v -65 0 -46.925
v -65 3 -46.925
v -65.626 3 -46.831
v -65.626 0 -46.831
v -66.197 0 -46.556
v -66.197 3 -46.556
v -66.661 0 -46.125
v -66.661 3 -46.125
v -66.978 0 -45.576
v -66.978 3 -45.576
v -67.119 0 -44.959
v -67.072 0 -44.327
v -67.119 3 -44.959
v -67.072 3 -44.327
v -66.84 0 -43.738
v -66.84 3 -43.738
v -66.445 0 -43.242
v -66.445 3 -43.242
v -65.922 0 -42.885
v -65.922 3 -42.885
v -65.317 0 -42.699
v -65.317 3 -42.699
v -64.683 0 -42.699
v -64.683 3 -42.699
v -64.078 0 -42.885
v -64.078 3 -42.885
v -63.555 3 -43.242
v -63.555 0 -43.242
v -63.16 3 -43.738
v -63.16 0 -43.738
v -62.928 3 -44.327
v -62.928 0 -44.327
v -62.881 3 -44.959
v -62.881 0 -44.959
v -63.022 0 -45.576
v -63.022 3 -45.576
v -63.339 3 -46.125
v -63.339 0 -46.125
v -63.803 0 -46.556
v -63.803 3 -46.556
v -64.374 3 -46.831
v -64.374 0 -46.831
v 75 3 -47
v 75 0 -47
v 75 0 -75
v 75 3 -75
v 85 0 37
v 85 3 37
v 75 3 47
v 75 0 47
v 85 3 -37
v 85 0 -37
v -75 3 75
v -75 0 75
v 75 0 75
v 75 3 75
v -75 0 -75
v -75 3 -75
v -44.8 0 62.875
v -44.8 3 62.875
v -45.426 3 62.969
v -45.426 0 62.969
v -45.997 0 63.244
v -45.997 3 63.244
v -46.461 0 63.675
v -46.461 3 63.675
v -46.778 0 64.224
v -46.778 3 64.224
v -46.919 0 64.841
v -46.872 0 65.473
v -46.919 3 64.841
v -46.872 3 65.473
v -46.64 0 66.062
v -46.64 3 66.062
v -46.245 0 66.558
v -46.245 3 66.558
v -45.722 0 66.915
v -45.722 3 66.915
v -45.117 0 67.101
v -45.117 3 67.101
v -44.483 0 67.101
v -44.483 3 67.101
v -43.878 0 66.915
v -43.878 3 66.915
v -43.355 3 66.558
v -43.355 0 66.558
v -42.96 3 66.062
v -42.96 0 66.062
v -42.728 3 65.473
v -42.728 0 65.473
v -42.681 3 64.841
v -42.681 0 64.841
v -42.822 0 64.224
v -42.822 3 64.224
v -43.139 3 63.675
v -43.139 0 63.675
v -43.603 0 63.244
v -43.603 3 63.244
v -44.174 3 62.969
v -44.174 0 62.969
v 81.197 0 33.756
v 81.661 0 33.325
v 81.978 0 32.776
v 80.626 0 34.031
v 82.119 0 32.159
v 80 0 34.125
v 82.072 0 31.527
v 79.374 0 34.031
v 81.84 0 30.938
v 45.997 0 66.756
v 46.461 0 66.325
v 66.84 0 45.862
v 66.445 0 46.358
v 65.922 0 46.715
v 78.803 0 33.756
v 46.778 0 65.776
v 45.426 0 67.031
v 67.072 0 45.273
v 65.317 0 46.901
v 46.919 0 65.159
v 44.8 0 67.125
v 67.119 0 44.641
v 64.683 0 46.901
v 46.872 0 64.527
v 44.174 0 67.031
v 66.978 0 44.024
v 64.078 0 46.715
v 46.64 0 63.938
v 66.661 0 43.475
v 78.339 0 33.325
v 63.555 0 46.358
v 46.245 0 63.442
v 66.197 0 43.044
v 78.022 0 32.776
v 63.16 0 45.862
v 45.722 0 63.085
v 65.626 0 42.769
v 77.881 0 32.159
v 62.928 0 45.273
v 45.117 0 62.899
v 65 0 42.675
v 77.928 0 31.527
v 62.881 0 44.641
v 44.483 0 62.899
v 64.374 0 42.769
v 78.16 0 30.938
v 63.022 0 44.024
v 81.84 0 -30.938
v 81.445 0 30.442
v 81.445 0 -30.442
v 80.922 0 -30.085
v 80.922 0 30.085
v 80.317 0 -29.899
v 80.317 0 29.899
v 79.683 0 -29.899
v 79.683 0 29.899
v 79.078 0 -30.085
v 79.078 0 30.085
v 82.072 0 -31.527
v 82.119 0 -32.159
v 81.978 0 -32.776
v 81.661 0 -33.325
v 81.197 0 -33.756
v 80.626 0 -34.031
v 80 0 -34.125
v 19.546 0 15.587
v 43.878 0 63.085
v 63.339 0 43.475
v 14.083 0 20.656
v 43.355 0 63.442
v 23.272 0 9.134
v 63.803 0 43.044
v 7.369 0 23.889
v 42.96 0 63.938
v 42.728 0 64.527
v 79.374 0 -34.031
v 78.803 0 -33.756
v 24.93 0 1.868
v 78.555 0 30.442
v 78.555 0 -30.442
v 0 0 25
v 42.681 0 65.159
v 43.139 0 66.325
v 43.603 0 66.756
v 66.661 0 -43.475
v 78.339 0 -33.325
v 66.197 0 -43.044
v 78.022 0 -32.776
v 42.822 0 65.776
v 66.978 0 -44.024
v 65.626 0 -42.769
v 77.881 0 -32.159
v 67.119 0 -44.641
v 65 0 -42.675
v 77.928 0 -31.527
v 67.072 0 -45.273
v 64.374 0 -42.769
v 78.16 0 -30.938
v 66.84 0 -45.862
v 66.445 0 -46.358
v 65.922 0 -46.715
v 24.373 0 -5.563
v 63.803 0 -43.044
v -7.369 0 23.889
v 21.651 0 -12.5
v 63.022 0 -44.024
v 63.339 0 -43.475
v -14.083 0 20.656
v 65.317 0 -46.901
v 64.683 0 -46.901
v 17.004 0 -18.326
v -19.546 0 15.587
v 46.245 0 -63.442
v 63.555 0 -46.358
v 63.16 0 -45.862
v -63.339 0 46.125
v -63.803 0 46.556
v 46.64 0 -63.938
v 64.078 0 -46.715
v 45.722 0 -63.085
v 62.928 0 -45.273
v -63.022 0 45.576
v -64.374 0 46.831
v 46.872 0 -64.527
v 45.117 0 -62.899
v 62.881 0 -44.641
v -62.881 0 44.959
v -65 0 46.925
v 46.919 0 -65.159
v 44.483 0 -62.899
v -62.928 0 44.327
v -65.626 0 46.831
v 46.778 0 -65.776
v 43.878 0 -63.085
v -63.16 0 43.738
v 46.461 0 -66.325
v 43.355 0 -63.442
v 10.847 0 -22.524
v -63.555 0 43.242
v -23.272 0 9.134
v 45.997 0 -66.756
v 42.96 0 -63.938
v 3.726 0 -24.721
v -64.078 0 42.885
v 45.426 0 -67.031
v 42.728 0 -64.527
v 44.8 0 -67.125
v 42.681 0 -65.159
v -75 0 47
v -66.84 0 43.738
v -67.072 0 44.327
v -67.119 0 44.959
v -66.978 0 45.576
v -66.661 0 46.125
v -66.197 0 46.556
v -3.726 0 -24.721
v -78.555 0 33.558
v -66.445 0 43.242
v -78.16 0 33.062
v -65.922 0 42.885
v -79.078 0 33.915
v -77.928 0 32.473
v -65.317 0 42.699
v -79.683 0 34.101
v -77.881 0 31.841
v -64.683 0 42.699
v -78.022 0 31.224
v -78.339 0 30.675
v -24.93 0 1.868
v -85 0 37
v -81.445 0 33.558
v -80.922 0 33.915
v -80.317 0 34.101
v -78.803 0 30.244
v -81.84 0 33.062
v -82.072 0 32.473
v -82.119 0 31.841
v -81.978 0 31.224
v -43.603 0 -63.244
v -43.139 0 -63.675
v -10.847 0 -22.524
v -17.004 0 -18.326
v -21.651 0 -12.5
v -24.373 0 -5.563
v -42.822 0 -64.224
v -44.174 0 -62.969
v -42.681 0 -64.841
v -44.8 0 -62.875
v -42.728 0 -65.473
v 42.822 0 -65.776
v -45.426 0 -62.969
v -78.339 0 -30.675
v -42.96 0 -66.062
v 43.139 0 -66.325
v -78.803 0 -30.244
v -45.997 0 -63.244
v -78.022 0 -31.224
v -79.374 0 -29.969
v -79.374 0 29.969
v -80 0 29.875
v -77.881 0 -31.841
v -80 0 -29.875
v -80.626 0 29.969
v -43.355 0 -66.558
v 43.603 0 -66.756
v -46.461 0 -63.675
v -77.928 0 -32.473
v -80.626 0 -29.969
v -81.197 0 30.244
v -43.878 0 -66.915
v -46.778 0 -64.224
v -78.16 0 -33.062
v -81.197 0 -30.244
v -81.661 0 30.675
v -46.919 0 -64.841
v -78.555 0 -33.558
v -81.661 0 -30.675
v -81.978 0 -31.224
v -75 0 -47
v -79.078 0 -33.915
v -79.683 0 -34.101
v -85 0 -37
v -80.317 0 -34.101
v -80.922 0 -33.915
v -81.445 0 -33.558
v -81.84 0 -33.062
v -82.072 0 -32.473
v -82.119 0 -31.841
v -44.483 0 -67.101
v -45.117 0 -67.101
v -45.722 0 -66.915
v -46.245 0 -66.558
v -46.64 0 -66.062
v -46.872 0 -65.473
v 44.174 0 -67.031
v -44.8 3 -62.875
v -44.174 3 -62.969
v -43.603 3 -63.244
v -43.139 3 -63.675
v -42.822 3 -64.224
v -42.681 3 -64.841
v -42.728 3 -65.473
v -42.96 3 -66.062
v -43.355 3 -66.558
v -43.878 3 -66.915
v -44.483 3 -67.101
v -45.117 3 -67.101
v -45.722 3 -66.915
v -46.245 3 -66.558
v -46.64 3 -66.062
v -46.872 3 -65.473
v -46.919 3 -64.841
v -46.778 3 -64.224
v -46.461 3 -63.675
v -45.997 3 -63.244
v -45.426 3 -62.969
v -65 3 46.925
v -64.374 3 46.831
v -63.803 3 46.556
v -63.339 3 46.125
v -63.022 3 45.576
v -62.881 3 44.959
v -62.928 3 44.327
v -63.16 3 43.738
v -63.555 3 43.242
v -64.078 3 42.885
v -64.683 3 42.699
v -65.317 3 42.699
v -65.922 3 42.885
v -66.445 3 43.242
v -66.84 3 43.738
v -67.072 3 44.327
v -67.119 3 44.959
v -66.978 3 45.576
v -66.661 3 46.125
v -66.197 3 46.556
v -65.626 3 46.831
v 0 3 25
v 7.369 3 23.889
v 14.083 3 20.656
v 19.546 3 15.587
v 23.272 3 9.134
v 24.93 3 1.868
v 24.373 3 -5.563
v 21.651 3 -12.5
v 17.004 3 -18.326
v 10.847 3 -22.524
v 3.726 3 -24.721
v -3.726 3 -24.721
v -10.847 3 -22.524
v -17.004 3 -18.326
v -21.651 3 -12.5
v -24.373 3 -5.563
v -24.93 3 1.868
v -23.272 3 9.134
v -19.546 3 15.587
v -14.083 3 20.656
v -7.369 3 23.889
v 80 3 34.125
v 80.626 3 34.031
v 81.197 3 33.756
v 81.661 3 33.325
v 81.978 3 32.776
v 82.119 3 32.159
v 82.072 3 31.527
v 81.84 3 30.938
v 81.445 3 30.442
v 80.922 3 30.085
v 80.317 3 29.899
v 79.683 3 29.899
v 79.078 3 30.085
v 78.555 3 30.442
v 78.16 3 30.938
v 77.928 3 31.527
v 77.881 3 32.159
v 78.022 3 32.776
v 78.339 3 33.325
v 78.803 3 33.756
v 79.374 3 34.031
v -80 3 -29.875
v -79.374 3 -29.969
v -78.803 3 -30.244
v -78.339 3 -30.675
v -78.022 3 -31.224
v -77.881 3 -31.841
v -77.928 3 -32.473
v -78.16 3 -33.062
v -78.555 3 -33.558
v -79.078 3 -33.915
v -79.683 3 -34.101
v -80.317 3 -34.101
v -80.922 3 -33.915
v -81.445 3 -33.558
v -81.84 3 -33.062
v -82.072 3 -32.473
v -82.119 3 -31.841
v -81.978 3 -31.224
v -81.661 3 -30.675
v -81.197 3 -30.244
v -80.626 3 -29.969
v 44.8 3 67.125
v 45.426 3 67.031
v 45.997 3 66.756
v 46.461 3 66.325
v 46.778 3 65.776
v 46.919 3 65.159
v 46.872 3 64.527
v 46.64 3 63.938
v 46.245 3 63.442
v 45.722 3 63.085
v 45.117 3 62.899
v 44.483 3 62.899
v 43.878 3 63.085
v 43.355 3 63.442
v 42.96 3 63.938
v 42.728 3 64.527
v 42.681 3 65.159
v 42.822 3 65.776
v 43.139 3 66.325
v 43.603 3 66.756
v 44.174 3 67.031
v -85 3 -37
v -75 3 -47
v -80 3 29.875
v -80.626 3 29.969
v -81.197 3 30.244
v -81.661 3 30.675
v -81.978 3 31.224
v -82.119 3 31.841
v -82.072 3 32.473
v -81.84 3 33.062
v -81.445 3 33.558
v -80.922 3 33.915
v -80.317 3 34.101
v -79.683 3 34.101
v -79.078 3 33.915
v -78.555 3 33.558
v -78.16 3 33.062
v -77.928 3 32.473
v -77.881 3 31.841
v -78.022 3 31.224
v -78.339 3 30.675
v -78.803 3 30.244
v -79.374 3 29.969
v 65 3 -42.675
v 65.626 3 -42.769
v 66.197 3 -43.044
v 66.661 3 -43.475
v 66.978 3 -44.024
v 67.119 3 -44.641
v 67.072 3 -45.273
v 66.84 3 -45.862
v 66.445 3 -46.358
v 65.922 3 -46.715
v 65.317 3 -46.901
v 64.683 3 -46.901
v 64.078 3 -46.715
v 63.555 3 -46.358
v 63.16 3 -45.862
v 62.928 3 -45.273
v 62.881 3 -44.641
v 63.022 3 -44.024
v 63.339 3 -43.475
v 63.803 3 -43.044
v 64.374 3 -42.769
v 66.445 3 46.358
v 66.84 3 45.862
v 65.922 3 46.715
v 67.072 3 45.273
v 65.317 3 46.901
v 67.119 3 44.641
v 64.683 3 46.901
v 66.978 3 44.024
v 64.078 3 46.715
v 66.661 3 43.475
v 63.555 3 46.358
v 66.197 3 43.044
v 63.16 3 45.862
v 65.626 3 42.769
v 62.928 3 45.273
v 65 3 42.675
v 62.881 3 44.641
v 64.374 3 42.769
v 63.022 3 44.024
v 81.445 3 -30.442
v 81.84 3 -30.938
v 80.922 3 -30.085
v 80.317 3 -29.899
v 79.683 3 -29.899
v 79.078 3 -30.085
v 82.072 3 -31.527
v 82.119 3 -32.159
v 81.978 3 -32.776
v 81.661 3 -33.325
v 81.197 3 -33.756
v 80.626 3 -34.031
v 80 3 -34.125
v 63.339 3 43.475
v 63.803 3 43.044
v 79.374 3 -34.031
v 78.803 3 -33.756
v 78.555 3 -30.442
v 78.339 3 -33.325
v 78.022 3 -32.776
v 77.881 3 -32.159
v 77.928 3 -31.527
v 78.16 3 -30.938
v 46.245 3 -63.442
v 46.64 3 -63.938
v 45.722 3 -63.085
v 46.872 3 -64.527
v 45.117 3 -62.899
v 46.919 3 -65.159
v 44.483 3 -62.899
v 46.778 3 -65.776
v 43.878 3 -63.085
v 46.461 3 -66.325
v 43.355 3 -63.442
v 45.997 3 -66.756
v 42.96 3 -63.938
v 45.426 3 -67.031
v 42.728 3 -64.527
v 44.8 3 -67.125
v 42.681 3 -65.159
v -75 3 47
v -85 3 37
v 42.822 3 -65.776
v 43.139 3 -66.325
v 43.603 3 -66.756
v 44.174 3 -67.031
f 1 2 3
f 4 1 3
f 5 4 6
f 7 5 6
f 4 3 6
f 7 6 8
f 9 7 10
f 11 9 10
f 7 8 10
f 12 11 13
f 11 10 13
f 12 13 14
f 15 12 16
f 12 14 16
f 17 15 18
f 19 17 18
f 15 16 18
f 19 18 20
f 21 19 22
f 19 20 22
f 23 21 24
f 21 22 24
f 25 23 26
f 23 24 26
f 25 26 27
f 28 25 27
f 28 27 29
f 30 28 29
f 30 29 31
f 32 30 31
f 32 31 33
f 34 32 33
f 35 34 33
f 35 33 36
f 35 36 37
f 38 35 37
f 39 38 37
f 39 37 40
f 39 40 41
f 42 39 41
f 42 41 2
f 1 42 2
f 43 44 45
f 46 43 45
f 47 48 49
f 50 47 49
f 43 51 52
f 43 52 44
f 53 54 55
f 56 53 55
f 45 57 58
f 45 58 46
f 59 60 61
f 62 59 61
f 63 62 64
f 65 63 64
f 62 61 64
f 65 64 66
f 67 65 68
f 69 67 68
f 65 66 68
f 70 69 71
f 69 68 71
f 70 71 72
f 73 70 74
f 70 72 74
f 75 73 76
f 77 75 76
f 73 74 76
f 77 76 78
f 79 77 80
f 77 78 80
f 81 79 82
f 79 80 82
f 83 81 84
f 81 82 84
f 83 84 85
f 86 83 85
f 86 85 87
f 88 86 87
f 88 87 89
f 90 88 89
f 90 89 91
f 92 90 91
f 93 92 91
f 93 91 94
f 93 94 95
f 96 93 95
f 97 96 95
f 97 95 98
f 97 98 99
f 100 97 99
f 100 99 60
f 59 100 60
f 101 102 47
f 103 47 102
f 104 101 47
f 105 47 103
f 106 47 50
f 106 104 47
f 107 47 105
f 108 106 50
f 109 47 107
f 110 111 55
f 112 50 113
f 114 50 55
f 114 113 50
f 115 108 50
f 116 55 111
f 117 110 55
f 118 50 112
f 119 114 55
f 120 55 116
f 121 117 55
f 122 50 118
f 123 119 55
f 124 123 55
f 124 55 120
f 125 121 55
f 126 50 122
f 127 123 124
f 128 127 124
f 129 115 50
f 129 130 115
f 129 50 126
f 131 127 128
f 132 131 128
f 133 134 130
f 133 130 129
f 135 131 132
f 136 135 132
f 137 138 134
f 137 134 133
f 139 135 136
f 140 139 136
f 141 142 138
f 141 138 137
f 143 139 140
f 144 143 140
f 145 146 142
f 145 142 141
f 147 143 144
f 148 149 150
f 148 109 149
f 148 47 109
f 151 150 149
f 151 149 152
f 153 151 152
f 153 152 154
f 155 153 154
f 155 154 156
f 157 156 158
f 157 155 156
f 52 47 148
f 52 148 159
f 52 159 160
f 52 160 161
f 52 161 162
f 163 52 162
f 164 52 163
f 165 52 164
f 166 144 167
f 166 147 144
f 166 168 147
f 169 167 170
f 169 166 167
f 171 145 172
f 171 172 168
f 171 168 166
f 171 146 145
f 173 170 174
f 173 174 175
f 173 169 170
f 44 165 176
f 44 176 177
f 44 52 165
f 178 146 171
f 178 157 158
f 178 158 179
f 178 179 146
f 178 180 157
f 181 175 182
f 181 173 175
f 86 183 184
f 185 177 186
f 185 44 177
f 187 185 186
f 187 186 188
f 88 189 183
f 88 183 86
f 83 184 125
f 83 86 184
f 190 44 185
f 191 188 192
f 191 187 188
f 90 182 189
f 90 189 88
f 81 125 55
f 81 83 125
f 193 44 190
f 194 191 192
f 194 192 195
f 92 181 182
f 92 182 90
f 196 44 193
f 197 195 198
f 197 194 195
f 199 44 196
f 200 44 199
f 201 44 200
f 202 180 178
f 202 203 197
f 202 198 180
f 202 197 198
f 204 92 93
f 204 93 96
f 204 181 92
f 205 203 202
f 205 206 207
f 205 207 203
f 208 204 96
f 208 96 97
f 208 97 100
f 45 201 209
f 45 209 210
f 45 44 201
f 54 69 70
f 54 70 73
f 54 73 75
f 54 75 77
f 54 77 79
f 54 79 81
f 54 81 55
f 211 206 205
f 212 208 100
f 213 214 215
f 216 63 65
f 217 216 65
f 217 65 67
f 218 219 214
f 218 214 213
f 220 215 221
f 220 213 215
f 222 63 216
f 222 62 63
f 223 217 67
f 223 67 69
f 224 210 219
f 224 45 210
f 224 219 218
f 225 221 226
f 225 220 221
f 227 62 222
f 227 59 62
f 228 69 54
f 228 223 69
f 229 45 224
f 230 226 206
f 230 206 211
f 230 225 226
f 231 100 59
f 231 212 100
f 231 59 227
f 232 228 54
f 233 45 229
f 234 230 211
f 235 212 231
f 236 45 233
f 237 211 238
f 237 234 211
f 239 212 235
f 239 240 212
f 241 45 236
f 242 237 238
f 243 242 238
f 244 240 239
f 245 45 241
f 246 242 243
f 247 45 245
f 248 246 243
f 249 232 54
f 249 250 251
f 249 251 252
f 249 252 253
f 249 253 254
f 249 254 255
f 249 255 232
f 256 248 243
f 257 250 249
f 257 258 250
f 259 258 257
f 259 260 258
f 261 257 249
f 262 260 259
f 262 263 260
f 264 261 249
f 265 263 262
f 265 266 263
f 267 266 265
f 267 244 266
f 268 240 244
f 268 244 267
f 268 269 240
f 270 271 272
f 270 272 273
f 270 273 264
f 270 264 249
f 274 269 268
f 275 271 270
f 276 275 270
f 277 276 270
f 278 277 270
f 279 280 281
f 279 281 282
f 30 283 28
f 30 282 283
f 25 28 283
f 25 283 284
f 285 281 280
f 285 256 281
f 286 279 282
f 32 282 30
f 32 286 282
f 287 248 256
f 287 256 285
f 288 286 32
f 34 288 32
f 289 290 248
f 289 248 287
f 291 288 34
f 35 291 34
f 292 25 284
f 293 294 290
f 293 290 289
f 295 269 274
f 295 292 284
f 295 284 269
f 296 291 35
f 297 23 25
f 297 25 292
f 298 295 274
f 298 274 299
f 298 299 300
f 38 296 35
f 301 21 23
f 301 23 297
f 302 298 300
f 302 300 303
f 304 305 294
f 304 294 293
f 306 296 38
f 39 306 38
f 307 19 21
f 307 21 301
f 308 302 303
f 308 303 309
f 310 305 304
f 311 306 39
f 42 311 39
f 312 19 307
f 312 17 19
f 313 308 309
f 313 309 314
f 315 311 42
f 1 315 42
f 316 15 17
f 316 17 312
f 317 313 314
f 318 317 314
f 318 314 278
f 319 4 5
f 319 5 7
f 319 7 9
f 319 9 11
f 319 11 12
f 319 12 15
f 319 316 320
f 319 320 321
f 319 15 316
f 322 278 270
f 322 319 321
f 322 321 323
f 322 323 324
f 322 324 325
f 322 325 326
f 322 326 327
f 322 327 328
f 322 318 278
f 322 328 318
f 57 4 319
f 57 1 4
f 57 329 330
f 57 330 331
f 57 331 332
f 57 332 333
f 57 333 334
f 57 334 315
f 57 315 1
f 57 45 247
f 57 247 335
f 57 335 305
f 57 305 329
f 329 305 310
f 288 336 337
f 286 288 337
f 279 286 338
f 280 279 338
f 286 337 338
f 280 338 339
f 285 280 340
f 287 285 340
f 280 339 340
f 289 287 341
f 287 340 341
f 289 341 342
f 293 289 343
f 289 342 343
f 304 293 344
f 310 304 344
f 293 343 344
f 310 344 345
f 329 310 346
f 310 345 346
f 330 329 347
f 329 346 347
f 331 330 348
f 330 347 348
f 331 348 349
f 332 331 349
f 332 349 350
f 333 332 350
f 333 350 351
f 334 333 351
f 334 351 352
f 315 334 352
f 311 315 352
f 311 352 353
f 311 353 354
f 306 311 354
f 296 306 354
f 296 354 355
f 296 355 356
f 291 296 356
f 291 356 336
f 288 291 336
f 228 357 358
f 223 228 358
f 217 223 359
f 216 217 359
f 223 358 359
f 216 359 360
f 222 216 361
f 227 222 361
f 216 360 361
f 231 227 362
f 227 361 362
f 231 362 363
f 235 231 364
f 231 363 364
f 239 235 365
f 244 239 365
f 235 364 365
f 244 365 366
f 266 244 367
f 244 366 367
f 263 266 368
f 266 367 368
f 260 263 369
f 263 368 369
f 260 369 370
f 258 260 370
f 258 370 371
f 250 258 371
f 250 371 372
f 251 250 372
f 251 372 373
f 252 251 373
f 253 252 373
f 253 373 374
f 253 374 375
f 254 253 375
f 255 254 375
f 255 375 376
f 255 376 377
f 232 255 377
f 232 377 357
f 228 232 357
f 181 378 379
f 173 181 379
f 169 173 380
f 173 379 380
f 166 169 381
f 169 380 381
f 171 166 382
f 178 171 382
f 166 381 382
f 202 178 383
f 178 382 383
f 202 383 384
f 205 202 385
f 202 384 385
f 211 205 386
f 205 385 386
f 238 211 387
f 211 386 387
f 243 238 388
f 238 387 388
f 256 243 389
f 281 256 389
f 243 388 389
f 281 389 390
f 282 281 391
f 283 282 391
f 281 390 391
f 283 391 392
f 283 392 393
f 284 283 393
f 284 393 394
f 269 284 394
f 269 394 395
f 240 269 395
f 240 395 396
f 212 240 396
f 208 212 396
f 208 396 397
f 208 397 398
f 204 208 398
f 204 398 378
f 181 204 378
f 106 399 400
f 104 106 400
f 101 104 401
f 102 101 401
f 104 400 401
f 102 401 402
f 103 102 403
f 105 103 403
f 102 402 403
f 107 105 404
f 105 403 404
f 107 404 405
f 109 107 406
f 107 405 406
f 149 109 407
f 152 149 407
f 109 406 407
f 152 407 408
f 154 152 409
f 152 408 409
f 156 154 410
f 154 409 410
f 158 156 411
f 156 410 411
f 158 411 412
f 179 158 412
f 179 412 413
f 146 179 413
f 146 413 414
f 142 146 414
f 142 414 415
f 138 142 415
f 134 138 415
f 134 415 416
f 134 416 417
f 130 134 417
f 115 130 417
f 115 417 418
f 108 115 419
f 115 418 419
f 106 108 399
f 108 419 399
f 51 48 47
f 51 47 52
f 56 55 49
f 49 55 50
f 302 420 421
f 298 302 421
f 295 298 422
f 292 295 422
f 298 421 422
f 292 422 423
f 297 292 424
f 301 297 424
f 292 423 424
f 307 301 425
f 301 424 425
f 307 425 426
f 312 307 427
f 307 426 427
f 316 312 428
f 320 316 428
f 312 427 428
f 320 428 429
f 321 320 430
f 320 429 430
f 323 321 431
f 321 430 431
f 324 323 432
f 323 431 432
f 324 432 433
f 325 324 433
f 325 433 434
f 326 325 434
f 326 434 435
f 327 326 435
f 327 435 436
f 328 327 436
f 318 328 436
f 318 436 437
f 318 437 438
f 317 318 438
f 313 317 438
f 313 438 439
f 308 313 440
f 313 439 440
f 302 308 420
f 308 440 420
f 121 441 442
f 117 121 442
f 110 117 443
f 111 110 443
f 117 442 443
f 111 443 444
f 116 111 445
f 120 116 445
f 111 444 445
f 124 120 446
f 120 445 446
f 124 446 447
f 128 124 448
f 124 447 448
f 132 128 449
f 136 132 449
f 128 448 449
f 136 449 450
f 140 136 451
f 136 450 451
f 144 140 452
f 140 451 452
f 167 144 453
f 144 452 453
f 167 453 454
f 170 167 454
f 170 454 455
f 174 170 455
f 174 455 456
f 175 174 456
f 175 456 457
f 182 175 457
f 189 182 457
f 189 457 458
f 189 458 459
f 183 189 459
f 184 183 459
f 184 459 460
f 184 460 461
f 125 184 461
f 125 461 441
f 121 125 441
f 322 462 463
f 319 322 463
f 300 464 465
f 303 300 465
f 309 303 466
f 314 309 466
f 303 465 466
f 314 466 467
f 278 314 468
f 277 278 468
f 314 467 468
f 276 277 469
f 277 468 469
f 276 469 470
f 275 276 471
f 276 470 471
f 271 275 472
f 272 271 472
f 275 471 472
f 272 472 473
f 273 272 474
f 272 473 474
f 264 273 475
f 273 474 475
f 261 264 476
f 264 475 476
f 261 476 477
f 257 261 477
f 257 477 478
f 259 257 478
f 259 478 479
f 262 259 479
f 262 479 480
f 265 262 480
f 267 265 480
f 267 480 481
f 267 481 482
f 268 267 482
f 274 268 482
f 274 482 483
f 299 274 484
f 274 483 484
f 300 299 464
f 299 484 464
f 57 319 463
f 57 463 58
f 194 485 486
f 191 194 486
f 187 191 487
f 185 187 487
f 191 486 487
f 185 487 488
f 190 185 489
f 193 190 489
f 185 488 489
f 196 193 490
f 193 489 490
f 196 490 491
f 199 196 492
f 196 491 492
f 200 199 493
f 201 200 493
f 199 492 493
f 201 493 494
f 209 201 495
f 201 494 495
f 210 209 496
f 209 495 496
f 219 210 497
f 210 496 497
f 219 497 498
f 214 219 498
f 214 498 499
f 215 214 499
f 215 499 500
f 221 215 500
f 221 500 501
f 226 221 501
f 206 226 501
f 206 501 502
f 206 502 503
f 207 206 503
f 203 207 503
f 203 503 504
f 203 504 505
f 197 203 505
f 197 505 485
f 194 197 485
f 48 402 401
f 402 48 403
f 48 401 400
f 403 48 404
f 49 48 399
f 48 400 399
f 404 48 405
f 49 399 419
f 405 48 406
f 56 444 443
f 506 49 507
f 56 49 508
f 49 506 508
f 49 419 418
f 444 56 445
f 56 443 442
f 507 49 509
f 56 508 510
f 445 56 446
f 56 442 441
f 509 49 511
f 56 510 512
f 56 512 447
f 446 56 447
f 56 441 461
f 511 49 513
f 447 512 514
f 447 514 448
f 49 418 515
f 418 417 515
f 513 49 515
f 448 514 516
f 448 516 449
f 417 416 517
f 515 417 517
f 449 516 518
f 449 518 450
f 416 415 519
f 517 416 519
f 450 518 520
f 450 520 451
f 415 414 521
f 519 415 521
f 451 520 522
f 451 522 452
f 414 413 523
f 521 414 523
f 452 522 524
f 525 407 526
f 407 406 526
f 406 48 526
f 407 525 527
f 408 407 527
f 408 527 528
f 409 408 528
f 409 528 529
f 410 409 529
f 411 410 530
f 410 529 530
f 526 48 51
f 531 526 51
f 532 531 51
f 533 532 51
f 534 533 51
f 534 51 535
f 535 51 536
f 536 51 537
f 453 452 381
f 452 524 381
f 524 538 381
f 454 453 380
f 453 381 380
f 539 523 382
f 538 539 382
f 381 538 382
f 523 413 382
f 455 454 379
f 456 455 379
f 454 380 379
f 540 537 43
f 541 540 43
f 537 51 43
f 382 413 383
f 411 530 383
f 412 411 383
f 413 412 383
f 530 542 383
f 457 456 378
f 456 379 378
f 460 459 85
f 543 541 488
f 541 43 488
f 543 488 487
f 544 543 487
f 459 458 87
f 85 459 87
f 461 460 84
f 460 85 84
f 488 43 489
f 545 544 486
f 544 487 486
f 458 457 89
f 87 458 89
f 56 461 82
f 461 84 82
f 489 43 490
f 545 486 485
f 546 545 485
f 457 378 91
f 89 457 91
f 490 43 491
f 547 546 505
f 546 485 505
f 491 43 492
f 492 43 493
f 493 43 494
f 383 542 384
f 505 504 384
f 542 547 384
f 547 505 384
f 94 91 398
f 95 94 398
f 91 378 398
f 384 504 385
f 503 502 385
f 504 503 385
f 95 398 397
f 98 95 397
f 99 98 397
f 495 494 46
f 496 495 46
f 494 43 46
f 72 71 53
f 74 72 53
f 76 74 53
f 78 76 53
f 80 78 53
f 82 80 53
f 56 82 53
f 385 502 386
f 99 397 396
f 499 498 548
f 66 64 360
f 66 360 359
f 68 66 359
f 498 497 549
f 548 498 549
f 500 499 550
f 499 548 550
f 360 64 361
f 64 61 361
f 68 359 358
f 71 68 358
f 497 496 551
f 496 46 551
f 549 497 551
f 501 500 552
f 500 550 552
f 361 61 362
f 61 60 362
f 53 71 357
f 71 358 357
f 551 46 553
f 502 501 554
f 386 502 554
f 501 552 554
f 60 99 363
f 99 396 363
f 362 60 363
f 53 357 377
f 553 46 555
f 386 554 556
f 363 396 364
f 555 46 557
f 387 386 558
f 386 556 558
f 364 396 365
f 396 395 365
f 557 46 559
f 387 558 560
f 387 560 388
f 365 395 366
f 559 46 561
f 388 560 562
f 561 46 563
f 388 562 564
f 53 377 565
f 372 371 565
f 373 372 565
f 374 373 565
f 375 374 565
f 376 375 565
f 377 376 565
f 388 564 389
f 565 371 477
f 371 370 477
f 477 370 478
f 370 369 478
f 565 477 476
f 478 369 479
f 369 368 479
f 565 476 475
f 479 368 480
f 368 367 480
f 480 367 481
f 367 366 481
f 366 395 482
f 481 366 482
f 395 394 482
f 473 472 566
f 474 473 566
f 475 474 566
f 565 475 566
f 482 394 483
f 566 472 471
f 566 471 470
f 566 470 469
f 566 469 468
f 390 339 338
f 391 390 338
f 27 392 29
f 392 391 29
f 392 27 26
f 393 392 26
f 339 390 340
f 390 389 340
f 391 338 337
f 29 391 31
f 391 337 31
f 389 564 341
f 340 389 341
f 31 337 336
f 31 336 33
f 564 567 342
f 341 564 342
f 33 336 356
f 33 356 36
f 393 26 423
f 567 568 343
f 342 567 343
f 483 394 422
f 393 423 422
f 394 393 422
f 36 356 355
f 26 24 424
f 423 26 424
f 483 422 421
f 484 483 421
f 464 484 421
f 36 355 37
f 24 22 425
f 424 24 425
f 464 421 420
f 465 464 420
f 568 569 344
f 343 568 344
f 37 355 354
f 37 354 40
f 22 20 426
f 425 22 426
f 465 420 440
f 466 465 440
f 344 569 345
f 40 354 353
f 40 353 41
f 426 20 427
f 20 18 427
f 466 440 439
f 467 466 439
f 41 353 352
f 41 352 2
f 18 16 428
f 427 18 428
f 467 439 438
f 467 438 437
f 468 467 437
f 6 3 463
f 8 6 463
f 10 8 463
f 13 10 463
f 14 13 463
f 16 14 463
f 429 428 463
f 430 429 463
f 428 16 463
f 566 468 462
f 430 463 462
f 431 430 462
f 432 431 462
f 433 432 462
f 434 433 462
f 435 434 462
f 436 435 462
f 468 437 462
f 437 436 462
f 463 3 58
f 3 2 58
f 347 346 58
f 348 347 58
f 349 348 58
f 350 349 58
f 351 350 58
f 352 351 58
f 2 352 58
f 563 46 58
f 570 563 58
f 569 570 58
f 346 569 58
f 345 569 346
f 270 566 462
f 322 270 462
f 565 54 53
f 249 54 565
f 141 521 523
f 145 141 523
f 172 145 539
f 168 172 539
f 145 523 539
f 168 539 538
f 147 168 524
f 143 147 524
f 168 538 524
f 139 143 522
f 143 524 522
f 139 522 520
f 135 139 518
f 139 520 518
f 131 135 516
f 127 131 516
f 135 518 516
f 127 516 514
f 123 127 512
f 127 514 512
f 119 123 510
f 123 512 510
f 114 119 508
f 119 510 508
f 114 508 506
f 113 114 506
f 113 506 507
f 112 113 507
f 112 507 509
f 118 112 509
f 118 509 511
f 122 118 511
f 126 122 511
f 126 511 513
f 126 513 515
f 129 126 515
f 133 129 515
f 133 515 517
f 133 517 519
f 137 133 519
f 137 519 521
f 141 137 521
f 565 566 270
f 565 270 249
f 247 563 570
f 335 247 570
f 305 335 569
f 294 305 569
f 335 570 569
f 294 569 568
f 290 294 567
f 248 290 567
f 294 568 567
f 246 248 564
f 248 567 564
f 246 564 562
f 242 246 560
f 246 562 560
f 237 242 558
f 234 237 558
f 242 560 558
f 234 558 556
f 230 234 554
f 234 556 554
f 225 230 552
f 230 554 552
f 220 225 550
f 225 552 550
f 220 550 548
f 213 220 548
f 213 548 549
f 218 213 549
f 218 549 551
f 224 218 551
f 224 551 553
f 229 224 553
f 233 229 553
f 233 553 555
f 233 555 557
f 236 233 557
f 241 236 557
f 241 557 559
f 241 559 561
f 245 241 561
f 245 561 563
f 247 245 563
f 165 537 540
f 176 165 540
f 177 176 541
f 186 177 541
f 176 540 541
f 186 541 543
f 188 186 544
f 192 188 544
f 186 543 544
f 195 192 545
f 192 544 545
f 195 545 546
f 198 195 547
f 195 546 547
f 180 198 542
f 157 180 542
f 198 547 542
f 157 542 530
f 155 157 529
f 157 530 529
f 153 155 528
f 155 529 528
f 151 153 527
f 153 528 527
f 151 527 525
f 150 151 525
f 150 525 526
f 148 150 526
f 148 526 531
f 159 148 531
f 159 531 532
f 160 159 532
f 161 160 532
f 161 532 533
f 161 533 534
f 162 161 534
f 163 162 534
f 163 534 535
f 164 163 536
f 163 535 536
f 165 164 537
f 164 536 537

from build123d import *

# Parameters (mm, degrees)
SKETCH1_W           = 150
SKETCH1_H           = 150
BOSS_EXTRUDE1_DEPTH = 3
SKETCH2_R           = 2.125
SKETCH2_R_2         = 25
CUT_EXTRUDE3_DEPTH  = 107.108435103
SKETCH3_W           = 10
SKETCH3_H           = 74
SKETCH3_R           = 2.125
BOSS_EXTRUDE2_DEPTH = 3
BOSS_EXTRUDE3_DEPTH = 3


with BuildPart() as part:
    # Sketch1 → Boss-Extrude1 (new body)
    with BuildSketch(Plane(origin=(0, 0, 0), x_dir=(1, 0, 0), z_dir=(0, 1, 0))):
        Rectangle(SKETCH1_W, SKETCH1_H)
    extrude(amount=BOSS_EXTRUDE1_DEPTH)

    # Sketch2 → Cut-Extrude3 (cut, through all)
    with BuildSketch(Plane(origin=(0, 3, 0), x_dir=(1, 0, 0), z_dir=(0, 1, 0))):
        with Locations(Location((-65, -44.8, 0), (0, 0, 270))):
            Circle(SKETCH2_R)
        with Locations(Location((-65, 44.8, 0), (0, 0, 90))):
            Circle(SKETCH2_R)
        with Locations(Location((-44.8, 65, 0), (0, 0, 270))):
            Circle(SKETCH2_R)
        with Locations(Location((44.8, 65, 0), (0, 0, 90))):
            Circle(SKETCH2_R)
        with Locations(Location((65, 44.8, 0), (0, 0, 270))):
            Circle(SKETCH2_R)
        with Locations(Location((65, -44.8, 0), (0, 0, 90))):
            Circle(SKETCH2_R)
        with Locations(Location((44.8, -65, 0), (0, 0, 270))):
            Circle(SKETCH2_R)
        with Locations(Location((-44.8, -65, 0), (0, 0, 90))):
            Circle(SKETCH2_R)
        with Locations(Location((0, 0, 0), (0, 0, 270))):
            Circle(SKETCH2_R_2)
    extrude(amount=-CUT_EXTRUDE3_DEPTH, mode=Mode.SUBTRACT)

    # Sketch3 → Boss-Extrude2 (add)
    # profile 1 of 2: a face of its own
    with BuildSketch(Plane(origin=(0, 3, 0), x_dir=(1, 0, 0), z_dir=(0, 1, 0))):
        with Locations((-80, 0)):
            Rectangle(SKETCH3_W, SKETCH3_H)
        with Locations(Location((-80, 32, 0), (0, 0, 270))):
            Circle(SKETCH3_R, mode=Mode.SUBTRACT)
        with Locations(Location((-80, -32, 0), (0, 0, 90))):
            Circle(SKETCH3_R, mode=Mode.SUBTRACT)
    # profile 2 of 2: a face of its own
    with BuildSketch(Plane(origin=(0, 3, 0), x_dir=(1, 0, 0), z_dir=(0, 1, 0))):
        with Locations((80, 0)):
            Rectangle(SKETCH3_W, SKETCH3_H)
        with Locations(Location((80, -32, 0), (0, 0, 270))):
            Circle(SKETCH3_R, mode=Mode.SUBTRACT)
        with Locations(Location((80, 32, 0), (0, 0, 90))):
            Circle(SKETCH3_R, mode=Mode.SUBTRACT)
    extrude(amount=-BOSS_EXTRUDE2_DEPTH)

    # Sketch4 → Boss-Extrude3 (add)
    with BuildSketch(Plane(origin=(0, 3, 0), x_dir=(1, 0, 0), z_dir=(0, 1, 0))):
        Polygon((-85, 37), (-75, 47), (-75, 37), align=None)
        Polygon((75, 47), (75, 37), (85, 37), align=None)
        Polygon((85, -37), (75, -47), (75, -37), align=None)
        Polygon((-75, -47), (-75, -37), (-85, -37), align=None)
    extrude(amount=-BOSS_EXTRUDE3_DEPTH)


solid = part.part
